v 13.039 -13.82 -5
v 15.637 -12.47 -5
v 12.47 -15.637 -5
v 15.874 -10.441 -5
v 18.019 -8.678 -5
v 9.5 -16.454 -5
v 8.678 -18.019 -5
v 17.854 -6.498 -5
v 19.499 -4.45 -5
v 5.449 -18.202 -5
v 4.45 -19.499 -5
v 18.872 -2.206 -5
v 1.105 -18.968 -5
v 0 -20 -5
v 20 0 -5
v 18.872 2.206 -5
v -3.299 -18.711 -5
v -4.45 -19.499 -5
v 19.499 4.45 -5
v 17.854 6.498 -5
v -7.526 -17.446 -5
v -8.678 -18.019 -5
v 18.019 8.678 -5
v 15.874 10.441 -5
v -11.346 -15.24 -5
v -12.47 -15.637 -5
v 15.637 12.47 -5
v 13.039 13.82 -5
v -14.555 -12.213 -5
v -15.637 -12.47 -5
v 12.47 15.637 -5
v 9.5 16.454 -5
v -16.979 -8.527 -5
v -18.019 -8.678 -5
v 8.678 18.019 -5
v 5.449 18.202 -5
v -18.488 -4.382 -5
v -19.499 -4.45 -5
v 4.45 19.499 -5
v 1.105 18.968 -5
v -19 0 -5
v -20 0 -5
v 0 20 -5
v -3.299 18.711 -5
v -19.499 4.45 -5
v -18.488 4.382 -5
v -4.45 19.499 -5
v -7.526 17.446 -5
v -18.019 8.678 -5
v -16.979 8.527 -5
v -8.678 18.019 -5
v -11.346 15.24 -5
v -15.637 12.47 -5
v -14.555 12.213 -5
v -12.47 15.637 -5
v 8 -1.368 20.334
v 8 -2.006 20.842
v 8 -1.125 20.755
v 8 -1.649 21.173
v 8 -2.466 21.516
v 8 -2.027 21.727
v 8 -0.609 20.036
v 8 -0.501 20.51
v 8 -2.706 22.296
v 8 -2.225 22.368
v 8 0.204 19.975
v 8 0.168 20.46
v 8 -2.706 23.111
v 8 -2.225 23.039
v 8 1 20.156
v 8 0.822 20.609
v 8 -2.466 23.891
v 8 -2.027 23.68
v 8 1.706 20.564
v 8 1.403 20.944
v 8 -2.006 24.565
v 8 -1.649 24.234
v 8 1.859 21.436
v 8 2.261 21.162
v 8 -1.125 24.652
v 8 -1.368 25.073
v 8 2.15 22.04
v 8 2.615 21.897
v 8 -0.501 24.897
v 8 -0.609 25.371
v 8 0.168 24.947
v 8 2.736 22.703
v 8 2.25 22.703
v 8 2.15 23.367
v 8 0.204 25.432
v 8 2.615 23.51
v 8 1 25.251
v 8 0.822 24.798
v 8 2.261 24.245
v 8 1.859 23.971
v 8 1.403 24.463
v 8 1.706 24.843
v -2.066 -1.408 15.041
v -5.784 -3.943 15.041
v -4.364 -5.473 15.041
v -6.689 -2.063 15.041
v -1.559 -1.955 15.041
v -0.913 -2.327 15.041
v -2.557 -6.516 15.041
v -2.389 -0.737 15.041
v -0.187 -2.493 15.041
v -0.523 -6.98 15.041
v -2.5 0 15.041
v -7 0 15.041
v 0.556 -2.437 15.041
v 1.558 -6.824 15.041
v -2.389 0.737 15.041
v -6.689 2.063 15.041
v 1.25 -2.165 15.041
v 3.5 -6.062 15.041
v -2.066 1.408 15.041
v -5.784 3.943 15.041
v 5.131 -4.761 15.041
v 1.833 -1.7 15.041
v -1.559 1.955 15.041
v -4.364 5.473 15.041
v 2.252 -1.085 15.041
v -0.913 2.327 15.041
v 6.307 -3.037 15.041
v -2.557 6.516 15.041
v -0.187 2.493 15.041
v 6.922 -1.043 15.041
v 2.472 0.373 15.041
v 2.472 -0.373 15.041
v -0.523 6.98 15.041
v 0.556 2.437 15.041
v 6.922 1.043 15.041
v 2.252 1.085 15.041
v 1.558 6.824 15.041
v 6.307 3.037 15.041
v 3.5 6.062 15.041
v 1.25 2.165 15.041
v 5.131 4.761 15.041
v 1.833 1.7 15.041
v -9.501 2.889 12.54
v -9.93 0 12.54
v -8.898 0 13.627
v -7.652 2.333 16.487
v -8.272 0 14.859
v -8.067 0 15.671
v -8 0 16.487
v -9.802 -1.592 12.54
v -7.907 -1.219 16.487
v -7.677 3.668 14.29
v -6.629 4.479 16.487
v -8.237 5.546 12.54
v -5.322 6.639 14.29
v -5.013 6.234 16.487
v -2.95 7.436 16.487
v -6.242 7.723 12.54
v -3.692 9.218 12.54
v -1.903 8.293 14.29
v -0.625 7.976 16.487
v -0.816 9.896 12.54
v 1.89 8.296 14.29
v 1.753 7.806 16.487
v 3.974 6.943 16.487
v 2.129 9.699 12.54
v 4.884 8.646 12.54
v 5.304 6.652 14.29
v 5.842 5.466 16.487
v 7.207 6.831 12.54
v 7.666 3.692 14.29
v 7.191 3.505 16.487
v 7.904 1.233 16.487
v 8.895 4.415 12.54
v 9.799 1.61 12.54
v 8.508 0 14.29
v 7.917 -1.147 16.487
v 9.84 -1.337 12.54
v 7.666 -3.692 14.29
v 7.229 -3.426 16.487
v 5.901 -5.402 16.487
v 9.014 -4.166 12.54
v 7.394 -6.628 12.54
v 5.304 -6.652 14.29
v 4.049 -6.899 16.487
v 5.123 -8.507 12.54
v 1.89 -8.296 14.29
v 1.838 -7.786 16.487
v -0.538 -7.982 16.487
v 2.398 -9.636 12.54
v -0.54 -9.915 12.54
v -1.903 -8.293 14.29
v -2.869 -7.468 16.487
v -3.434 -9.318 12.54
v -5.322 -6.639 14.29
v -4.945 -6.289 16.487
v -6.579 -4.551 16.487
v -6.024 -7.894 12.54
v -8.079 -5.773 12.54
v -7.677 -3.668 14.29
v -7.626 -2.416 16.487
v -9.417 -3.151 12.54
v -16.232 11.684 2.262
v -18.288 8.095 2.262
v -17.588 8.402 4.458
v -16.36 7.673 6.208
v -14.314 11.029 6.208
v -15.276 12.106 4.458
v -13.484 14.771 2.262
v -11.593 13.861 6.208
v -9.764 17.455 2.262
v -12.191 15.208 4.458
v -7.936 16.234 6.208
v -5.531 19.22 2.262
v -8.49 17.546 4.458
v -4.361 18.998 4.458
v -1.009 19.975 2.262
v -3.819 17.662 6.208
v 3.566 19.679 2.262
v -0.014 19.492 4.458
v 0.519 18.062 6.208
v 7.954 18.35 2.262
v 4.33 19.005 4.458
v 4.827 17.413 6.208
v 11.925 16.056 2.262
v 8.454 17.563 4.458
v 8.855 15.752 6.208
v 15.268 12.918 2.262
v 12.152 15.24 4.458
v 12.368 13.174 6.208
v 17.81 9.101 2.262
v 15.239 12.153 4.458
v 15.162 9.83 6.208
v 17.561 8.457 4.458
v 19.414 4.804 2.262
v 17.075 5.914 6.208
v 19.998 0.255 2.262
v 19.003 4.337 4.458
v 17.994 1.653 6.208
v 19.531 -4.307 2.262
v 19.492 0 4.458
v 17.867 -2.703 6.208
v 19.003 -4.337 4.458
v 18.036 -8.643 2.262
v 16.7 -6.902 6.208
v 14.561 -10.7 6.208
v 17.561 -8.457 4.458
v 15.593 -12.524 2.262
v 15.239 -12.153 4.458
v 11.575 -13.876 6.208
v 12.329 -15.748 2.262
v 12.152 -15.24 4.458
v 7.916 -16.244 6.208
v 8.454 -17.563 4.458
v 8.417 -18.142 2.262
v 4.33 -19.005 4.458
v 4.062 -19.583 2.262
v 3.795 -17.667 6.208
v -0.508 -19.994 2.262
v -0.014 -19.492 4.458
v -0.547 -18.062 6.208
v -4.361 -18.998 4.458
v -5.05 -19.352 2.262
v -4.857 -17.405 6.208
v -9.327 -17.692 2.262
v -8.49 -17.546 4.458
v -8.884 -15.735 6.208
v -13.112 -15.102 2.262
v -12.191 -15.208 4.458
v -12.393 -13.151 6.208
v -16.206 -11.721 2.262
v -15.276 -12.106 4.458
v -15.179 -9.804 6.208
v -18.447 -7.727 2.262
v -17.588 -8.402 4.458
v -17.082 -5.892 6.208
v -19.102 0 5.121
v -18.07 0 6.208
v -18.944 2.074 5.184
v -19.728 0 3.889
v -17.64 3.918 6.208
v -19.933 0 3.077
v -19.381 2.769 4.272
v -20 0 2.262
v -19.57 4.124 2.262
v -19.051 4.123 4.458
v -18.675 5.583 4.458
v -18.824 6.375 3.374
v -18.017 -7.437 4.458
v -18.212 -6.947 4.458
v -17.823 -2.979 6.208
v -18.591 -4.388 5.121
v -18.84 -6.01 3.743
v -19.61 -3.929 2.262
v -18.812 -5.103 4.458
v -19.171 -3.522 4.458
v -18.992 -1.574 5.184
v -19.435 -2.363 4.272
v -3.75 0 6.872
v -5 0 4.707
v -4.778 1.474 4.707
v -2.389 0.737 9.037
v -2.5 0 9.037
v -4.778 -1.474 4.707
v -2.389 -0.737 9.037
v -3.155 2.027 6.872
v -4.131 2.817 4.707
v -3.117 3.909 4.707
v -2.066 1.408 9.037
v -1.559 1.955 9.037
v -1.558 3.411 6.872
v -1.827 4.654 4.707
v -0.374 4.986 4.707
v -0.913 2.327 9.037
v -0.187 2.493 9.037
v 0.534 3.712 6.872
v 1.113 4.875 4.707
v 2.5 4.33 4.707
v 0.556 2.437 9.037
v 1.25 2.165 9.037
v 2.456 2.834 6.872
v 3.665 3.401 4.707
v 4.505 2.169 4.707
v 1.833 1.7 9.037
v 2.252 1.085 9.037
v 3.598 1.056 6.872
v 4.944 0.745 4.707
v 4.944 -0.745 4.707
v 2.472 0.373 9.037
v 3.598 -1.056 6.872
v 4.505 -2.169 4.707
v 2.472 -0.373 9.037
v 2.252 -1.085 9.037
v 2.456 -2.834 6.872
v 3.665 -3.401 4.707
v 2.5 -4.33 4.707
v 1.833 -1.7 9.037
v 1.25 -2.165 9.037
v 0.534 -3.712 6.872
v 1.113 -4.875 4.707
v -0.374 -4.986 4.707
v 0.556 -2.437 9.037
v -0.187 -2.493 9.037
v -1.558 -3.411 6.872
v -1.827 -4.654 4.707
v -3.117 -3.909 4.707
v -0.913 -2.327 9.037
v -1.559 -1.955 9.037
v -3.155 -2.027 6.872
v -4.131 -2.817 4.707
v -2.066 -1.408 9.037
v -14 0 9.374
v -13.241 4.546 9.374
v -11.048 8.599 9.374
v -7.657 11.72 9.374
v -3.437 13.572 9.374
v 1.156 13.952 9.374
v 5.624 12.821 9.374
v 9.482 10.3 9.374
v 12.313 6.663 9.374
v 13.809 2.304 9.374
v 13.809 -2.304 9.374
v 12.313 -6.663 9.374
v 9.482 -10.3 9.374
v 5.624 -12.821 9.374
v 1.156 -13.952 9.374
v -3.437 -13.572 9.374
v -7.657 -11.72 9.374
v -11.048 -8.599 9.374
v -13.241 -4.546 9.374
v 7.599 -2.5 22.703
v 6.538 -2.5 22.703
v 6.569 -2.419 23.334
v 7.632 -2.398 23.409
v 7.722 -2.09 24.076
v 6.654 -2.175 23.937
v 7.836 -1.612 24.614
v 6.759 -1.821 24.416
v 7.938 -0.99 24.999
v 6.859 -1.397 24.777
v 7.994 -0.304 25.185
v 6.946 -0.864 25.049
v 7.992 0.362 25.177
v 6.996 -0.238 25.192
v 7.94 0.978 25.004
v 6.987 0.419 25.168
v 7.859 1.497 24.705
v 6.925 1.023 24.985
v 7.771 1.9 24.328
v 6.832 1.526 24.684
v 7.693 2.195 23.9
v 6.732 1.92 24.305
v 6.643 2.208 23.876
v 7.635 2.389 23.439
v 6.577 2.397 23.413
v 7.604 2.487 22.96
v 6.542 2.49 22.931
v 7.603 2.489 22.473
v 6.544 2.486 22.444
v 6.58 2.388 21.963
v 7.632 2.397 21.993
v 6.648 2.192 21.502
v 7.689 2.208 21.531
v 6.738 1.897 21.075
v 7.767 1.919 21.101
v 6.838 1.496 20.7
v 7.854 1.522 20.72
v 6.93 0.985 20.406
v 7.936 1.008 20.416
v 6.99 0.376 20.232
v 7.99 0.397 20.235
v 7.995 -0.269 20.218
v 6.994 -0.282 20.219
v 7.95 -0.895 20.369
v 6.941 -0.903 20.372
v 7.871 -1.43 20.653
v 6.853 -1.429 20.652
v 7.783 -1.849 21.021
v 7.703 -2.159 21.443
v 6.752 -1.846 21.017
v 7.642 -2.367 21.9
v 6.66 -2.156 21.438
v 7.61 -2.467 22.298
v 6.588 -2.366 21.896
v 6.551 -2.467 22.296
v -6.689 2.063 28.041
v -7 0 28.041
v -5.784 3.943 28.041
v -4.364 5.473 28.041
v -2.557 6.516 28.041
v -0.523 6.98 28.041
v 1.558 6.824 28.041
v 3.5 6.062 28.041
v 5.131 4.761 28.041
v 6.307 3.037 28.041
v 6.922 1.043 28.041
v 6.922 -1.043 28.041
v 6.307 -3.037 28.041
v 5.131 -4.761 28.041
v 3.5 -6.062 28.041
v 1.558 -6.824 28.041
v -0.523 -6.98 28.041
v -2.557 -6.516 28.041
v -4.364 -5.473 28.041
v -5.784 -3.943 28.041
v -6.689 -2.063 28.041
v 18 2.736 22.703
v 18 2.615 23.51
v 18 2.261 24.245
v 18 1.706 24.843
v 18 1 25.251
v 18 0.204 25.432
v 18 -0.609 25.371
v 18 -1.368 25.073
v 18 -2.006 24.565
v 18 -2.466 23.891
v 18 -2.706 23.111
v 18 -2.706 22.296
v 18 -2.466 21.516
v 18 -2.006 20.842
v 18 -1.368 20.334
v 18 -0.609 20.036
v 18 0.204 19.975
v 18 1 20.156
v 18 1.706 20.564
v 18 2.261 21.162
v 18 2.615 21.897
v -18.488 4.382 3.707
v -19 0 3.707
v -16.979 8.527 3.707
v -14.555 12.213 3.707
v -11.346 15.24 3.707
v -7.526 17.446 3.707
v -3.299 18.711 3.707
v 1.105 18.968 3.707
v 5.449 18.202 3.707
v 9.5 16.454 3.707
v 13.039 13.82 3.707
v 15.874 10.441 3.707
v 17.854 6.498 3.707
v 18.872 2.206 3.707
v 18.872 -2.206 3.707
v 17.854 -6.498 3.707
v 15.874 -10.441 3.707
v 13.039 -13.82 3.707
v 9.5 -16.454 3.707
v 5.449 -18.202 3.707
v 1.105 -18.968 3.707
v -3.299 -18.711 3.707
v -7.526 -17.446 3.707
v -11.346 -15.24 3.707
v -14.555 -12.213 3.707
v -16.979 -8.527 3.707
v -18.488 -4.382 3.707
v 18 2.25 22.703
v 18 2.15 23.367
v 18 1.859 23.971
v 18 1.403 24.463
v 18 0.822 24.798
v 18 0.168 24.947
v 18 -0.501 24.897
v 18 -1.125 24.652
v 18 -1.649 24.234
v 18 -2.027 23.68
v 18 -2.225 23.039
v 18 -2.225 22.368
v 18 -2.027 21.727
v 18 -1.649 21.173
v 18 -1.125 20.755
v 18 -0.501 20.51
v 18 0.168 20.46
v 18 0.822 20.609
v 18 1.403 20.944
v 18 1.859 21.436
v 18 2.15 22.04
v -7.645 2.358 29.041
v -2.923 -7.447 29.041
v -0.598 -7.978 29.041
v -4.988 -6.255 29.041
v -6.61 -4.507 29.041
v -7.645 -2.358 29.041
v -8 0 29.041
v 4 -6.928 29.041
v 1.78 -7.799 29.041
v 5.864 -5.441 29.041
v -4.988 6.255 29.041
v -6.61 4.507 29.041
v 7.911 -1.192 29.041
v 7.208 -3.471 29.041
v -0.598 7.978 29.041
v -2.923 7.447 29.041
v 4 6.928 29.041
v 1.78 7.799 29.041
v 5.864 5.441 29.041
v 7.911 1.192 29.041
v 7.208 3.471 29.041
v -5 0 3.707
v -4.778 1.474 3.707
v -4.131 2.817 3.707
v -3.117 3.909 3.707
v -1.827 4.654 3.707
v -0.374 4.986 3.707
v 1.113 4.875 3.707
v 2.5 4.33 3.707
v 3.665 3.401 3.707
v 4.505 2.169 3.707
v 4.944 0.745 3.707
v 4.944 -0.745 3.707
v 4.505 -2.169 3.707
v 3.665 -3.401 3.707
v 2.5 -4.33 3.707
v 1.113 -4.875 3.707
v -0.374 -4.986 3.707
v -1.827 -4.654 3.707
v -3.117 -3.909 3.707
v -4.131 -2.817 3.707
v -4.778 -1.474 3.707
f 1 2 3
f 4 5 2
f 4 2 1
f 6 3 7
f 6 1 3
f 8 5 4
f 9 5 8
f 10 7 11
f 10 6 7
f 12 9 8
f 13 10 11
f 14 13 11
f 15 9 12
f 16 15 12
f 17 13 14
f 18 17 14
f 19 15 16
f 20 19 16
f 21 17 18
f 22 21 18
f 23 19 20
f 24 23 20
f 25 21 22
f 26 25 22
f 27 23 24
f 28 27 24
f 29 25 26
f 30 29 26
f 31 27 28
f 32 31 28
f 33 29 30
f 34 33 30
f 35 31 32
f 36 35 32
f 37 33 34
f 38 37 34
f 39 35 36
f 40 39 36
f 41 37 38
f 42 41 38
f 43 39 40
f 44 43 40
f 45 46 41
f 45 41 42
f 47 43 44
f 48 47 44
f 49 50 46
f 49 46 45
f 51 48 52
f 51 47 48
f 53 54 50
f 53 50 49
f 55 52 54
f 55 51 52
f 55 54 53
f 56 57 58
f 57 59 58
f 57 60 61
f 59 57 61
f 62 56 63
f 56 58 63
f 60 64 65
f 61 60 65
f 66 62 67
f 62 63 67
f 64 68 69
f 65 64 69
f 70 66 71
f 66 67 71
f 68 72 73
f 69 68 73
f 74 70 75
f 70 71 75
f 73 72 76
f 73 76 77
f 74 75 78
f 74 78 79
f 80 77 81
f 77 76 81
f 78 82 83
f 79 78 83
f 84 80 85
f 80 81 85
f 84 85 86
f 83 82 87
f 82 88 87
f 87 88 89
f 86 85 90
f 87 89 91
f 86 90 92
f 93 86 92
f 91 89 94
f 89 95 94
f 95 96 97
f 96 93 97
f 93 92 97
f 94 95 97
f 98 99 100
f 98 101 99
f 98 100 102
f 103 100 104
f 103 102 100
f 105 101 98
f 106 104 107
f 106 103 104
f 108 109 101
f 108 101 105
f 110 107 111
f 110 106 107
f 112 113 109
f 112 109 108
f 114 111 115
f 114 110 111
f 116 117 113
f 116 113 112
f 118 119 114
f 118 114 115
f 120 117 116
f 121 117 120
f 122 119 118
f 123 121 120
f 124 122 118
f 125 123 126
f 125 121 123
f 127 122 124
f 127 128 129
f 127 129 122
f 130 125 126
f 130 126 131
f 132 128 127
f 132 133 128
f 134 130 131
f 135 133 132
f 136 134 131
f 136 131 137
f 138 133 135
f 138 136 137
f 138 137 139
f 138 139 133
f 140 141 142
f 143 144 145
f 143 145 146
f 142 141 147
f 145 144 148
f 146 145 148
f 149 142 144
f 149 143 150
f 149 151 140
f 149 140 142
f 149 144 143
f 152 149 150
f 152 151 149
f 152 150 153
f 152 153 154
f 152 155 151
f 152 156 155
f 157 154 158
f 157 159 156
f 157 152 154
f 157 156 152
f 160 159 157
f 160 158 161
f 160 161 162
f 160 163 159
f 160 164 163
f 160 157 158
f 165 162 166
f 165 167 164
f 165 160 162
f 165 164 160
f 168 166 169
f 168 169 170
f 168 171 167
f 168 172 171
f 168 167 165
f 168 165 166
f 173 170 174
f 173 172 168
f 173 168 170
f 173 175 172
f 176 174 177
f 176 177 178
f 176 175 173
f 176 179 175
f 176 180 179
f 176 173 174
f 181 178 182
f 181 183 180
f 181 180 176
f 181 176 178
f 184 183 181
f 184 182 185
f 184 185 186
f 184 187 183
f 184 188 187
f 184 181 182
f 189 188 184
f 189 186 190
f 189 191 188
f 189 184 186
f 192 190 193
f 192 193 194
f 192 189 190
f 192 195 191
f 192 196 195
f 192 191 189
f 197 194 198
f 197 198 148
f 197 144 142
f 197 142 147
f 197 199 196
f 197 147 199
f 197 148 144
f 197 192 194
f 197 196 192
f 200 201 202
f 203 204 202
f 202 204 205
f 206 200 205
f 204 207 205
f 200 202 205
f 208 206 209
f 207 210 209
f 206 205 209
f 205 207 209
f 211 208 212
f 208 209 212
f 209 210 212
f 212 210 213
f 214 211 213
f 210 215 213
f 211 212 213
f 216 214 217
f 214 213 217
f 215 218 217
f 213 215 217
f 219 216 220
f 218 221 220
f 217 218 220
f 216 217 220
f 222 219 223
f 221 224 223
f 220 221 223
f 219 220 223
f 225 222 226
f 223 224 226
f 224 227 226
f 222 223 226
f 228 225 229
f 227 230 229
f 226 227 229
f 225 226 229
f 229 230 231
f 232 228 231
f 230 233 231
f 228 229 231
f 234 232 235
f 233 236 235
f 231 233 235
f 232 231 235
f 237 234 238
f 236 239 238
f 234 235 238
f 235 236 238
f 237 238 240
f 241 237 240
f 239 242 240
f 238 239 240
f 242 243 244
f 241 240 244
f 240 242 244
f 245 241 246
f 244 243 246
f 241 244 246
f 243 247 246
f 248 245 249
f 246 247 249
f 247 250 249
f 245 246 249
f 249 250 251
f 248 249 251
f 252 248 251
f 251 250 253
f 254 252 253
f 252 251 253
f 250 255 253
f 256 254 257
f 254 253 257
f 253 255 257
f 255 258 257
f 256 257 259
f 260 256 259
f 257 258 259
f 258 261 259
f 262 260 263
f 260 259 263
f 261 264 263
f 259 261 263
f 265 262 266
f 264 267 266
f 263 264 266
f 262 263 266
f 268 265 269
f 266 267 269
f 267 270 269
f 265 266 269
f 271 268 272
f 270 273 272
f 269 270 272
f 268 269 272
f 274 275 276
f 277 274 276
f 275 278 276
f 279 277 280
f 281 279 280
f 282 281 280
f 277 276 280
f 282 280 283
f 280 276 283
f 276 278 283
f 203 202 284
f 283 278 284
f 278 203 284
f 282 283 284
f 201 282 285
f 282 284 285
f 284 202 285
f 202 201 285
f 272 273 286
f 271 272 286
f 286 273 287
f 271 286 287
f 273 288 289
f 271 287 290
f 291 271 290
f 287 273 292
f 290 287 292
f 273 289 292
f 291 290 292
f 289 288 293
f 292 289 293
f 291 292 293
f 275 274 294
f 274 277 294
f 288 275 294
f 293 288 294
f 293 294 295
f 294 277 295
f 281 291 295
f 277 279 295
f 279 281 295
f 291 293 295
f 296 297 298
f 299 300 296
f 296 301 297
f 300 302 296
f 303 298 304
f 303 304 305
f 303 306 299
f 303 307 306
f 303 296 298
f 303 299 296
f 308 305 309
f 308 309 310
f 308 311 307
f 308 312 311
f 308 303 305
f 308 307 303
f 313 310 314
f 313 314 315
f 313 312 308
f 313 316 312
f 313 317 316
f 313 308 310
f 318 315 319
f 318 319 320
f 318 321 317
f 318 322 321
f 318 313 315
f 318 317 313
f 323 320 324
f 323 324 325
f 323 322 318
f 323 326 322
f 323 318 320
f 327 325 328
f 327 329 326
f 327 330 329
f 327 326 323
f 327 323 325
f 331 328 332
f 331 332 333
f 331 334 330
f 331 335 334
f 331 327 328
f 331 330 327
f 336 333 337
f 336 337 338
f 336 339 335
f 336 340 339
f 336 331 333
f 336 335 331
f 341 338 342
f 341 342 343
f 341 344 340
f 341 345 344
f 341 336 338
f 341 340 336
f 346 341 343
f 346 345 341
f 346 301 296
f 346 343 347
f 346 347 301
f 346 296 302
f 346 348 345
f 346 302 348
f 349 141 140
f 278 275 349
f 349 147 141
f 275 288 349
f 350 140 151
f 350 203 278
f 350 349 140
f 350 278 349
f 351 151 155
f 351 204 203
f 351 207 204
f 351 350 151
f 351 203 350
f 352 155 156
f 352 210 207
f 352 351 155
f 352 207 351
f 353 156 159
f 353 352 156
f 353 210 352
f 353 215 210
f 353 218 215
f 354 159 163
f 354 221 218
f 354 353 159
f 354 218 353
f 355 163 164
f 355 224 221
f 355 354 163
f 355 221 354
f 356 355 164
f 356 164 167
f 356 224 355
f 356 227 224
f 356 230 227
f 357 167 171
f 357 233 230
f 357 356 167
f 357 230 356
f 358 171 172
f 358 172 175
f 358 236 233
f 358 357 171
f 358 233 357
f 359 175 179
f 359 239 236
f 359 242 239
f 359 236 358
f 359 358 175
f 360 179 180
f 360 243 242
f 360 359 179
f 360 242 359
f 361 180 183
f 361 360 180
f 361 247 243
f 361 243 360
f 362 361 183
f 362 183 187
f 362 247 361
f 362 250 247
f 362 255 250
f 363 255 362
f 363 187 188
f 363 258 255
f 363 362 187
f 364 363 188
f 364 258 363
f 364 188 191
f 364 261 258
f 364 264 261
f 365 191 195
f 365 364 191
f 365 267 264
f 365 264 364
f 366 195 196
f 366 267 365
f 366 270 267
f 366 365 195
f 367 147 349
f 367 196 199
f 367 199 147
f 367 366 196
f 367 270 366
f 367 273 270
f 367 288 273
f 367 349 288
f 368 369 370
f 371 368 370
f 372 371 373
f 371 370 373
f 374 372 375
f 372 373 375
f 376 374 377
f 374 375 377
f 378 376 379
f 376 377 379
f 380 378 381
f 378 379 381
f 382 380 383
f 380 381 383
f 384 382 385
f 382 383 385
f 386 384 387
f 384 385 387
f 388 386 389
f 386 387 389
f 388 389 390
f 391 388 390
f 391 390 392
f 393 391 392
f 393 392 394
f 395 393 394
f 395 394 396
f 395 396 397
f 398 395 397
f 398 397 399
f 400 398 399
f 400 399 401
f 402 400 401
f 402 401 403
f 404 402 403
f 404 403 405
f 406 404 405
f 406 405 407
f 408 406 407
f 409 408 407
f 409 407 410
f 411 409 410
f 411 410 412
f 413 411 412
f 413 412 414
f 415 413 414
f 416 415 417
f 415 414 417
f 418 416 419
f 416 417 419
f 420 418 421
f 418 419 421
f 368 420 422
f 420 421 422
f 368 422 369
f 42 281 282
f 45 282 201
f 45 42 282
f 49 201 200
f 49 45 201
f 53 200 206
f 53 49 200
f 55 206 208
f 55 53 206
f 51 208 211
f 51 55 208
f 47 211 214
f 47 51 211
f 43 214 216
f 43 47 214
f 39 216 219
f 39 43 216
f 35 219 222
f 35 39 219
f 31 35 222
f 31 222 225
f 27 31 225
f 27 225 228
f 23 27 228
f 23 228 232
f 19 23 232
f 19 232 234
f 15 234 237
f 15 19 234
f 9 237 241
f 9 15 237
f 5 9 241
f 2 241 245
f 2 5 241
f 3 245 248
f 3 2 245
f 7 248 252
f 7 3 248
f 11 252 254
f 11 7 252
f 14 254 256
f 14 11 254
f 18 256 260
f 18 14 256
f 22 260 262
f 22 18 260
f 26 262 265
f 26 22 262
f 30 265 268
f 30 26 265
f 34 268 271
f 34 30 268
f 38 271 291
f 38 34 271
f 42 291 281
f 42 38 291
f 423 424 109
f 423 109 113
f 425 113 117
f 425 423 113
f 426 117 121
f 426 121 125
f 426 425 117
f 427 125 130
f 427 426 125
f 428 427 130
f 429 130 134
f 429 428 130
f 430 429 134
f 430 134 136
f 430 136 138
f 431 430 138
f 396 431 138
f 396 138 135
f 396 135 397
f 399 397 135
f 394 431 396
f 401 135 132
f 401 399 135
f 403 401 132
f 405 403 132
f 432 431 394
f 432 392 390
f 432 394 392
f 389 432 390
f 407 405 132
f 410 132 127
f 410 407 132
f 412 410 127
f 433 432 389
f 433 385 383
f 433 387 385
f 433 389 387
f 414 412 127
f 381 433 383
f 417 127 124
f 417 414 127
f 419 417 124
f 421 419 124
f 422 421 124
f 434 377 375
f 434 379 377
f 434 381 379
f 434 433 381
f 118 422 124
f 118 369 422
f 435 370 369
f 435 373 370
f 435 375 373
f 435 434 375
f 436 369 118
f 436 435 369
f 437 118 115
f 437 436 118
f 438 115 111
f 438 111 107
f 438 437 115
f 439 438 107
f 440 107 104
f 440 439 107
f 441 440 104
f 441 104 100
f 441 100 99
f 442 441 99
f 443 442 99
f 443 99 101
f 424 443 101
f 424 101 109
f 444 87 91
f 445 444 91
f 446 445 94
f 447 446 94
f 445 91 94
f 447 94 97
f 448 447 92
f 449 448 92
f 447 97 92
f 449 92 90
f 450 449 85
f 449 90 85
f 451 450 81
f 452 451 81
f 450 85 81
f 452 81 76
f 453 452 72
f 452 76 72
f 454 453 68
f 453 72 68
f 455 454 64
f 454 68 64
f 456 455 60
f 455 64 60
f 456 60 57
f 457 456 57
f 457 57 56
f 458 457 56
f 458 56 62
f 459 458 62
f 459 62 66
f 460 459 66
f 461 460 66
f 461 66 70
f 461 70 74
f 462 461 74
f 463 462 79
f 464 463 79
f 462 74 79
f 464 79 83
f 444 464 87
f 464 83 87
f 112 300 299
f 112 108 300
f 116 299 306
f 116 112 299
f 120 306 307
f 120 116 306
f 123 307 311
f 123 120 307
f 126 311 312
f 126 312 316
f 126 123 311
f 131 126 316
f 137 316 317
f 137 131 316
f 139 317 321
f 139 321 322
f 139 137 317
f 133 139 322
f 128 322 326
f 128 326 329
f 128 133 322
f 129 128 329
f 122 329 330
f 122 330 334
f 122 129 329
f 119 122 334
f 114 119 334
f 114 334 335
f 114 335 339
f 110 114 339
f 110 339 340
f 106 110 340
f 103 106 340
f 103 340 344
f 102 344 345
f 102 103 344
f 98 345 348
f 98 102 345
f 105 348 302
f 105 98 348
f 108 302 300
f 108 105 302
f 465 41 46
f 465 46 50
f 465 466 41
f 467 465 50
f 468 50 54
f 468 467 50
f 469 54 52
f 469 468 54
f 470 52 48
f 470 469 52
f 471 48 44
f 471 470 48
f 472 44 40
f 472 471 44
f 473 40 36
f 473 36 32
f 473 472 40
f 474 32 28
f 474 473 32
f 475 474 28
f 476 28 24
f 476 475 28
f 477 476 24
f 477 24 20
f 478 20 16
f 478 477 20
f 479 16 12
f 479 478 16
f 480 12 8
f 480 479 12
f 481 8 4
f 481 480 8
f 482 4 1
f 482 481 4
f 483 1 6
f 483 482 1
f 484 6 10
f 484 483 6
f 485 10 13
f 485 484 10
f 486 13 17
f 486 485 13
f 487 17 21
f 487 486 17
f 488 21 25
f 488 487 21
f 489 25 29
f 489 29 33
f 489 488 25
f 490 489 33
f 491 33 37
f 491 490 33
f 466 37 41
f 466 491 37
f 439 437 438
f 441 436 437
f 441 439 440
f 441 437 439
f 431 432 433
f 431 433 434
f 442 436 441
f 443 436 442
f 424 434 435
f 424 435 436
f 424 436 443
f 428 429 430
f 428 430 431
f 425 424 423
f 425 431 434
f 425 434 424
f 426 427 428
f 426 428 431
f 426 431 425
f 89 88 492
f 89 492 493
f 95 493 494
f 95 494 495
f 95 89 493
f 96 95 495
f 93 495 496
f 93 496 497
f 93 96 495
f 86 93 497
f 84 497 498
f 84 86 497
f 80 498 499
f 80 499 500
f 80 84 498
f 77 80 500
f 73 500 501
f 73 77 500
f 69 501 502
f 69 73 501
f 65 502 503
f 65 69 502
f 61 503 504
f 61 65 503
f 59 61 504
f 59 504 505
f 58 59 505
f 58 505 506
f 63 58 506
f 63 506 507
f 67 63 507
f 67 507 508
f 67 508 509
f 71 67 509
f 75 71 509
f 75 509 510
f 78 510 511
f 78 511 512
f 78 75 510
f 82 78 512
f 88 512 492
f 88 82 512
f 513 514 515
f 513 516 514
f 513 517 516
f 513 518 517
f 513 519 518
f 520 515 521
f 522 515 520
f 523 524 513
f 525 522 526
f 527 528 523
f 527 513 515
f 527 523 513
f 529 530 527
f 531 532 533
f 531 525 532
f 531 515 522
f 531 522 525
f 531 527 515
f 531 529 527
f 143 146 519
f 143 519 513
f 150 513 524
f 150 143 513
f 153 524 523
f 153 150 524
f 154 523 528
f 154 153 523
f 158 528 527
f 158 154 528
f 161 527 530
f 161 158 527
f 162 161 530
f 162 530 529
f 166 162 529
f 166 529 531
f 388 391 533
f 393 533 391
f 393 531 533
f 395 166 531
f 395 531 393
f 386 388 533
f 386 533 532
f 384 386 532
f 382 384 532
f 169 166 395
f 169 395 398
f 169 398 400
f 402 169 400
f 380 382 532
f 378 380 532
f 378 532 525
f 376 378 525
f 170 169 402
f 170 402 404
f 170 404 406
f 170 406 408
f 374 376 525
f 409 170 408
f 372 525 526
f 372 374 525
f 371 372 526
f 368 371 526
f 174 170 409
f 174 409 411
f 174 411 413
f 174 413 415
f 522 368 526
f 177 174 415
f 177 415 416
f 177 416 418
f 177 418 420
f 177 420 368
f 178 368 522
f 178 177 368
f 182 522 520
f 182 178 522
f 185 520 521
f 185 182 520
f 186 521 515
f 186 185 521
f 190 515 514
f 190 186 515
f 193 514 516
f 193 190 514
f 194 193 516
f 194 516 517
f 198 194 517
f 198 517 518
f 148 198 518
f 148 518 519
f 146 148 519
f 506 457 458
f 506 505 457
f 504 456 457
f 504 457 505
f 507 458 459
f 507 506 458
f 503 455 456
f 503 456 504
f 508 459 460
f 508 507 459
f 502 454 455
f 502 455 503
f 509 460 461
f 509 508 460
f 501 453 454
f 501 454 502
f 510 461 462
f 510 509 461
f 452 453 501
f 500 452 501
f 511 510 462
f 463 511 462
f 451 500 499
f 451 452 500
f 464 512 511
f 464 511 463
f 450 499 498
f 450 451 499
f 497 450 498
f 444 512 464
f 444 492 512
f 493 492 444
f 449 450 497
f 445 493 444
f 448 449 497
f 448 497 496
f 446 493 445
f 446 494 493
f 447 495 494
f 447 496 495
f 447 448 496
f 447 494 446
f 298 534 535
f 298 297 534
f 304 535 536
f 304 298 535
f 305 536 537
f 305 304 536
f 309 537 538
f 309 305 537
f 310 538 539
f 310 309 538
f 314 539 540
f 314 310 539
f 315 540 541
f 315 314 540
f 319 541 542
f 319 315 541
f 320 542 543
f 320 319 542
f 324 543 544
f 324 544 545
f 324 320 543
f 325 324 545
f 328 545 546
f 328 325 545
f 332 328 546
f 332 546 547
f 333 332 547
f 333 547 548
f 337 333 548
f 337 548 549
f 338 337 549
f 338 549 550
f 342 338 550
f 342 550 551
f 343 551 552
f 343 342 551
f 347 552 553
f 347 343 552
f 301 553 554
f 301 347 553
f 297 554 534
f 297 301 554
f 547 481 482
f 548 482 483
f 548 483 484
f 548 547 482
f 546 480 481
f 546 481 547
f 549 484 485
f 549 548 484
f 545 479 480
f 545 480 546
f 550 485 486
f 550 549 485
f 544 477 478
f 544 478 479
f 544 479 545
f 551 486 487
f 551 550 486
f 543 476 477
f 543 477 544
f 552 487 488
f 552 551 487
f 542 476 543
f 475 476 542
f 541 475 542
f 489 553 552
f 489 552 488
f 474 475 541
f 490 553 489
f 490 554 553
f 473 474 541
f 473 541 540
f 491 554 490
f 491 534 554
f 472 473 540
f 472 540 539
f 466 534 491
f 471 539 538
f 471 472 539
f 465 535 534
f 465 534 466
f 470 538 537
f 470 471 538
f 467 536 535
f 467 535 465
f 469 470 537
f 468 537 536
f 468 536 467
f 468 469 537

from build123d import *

# Parameters (mm, degrees)
F2_R     = 5
F5_D     = 5
F5_DEPTH = 12
F4_R     = 2.7365
F4_R_2   = 2.25
F6_DEPTH = 10
F7_R     = 5


with BuildPart() as f1:
    # F0 (on Front) → F1 (revolve)
    with BuildSketch(Plane.XZ):
        Polygon((-8, 14.041387), (-20, 4.706839), (-6.154701, 4.706839), (-3.07735, 10.036966), (-3.07735, 14.034189), (-3.07735, 14.041387), align=None)
        Polygon((-6.154701, 4.706839), (-20, 4.706839), (-20, -5), (-19, -5), (-19, 3.706839), (-5, 3.706839), (-5, 4.706839), (-2.5, 9.036966), (-2.5, 10.036966), (-2.5, 13.44305), (-2.5, 15.041387), (-7, 15.041387), (-7, 28.041387), (0, 28.041387), (0, 29.041387), (-8, 29.041387), (-8, 14.041387), (-3.07735, 14.041387), (-3.07735, 14.034189), (-3.07735, 10.036966), align=None)
    revolve(axis=Axis((0, 0, 28.541387), (0, 0, -1)))

    # F2
    f2_edges = [f1.edges().sort_by_distance(p)[0] for p in [
        (8, 0, 14.041387),
    ]]
    fillet(f2_edges, radius=F2_R)

    # F5
    with Locations(Plane.YZ.offset(8)):
        with Locations((0, 22.70342)):
            Hole(F5_D / 2, depth=F5_DEPTH)

    # F7
    f7_edges = [f1.edges().sort_by_distance(p)[0] for p in [
        (20, 0, 4.706839),
    ]]
    fillet(f7_edges, radius=F7_R)


with BuildPart() as f6:
    # F4 (on offset) → F6 (new body)
    with BuildSketch(Plane.YZ.offset(8)):
        with Locations((0, 22.70342)):
            Circle(F4_R)
        with Locations((0, 22.70342)):
            Circle(F4_R_2, mode=Mode.SUBTRACT)
    extrude(amount=F6_DEPTH)


solid = Compound([f1.part, f6.part])
